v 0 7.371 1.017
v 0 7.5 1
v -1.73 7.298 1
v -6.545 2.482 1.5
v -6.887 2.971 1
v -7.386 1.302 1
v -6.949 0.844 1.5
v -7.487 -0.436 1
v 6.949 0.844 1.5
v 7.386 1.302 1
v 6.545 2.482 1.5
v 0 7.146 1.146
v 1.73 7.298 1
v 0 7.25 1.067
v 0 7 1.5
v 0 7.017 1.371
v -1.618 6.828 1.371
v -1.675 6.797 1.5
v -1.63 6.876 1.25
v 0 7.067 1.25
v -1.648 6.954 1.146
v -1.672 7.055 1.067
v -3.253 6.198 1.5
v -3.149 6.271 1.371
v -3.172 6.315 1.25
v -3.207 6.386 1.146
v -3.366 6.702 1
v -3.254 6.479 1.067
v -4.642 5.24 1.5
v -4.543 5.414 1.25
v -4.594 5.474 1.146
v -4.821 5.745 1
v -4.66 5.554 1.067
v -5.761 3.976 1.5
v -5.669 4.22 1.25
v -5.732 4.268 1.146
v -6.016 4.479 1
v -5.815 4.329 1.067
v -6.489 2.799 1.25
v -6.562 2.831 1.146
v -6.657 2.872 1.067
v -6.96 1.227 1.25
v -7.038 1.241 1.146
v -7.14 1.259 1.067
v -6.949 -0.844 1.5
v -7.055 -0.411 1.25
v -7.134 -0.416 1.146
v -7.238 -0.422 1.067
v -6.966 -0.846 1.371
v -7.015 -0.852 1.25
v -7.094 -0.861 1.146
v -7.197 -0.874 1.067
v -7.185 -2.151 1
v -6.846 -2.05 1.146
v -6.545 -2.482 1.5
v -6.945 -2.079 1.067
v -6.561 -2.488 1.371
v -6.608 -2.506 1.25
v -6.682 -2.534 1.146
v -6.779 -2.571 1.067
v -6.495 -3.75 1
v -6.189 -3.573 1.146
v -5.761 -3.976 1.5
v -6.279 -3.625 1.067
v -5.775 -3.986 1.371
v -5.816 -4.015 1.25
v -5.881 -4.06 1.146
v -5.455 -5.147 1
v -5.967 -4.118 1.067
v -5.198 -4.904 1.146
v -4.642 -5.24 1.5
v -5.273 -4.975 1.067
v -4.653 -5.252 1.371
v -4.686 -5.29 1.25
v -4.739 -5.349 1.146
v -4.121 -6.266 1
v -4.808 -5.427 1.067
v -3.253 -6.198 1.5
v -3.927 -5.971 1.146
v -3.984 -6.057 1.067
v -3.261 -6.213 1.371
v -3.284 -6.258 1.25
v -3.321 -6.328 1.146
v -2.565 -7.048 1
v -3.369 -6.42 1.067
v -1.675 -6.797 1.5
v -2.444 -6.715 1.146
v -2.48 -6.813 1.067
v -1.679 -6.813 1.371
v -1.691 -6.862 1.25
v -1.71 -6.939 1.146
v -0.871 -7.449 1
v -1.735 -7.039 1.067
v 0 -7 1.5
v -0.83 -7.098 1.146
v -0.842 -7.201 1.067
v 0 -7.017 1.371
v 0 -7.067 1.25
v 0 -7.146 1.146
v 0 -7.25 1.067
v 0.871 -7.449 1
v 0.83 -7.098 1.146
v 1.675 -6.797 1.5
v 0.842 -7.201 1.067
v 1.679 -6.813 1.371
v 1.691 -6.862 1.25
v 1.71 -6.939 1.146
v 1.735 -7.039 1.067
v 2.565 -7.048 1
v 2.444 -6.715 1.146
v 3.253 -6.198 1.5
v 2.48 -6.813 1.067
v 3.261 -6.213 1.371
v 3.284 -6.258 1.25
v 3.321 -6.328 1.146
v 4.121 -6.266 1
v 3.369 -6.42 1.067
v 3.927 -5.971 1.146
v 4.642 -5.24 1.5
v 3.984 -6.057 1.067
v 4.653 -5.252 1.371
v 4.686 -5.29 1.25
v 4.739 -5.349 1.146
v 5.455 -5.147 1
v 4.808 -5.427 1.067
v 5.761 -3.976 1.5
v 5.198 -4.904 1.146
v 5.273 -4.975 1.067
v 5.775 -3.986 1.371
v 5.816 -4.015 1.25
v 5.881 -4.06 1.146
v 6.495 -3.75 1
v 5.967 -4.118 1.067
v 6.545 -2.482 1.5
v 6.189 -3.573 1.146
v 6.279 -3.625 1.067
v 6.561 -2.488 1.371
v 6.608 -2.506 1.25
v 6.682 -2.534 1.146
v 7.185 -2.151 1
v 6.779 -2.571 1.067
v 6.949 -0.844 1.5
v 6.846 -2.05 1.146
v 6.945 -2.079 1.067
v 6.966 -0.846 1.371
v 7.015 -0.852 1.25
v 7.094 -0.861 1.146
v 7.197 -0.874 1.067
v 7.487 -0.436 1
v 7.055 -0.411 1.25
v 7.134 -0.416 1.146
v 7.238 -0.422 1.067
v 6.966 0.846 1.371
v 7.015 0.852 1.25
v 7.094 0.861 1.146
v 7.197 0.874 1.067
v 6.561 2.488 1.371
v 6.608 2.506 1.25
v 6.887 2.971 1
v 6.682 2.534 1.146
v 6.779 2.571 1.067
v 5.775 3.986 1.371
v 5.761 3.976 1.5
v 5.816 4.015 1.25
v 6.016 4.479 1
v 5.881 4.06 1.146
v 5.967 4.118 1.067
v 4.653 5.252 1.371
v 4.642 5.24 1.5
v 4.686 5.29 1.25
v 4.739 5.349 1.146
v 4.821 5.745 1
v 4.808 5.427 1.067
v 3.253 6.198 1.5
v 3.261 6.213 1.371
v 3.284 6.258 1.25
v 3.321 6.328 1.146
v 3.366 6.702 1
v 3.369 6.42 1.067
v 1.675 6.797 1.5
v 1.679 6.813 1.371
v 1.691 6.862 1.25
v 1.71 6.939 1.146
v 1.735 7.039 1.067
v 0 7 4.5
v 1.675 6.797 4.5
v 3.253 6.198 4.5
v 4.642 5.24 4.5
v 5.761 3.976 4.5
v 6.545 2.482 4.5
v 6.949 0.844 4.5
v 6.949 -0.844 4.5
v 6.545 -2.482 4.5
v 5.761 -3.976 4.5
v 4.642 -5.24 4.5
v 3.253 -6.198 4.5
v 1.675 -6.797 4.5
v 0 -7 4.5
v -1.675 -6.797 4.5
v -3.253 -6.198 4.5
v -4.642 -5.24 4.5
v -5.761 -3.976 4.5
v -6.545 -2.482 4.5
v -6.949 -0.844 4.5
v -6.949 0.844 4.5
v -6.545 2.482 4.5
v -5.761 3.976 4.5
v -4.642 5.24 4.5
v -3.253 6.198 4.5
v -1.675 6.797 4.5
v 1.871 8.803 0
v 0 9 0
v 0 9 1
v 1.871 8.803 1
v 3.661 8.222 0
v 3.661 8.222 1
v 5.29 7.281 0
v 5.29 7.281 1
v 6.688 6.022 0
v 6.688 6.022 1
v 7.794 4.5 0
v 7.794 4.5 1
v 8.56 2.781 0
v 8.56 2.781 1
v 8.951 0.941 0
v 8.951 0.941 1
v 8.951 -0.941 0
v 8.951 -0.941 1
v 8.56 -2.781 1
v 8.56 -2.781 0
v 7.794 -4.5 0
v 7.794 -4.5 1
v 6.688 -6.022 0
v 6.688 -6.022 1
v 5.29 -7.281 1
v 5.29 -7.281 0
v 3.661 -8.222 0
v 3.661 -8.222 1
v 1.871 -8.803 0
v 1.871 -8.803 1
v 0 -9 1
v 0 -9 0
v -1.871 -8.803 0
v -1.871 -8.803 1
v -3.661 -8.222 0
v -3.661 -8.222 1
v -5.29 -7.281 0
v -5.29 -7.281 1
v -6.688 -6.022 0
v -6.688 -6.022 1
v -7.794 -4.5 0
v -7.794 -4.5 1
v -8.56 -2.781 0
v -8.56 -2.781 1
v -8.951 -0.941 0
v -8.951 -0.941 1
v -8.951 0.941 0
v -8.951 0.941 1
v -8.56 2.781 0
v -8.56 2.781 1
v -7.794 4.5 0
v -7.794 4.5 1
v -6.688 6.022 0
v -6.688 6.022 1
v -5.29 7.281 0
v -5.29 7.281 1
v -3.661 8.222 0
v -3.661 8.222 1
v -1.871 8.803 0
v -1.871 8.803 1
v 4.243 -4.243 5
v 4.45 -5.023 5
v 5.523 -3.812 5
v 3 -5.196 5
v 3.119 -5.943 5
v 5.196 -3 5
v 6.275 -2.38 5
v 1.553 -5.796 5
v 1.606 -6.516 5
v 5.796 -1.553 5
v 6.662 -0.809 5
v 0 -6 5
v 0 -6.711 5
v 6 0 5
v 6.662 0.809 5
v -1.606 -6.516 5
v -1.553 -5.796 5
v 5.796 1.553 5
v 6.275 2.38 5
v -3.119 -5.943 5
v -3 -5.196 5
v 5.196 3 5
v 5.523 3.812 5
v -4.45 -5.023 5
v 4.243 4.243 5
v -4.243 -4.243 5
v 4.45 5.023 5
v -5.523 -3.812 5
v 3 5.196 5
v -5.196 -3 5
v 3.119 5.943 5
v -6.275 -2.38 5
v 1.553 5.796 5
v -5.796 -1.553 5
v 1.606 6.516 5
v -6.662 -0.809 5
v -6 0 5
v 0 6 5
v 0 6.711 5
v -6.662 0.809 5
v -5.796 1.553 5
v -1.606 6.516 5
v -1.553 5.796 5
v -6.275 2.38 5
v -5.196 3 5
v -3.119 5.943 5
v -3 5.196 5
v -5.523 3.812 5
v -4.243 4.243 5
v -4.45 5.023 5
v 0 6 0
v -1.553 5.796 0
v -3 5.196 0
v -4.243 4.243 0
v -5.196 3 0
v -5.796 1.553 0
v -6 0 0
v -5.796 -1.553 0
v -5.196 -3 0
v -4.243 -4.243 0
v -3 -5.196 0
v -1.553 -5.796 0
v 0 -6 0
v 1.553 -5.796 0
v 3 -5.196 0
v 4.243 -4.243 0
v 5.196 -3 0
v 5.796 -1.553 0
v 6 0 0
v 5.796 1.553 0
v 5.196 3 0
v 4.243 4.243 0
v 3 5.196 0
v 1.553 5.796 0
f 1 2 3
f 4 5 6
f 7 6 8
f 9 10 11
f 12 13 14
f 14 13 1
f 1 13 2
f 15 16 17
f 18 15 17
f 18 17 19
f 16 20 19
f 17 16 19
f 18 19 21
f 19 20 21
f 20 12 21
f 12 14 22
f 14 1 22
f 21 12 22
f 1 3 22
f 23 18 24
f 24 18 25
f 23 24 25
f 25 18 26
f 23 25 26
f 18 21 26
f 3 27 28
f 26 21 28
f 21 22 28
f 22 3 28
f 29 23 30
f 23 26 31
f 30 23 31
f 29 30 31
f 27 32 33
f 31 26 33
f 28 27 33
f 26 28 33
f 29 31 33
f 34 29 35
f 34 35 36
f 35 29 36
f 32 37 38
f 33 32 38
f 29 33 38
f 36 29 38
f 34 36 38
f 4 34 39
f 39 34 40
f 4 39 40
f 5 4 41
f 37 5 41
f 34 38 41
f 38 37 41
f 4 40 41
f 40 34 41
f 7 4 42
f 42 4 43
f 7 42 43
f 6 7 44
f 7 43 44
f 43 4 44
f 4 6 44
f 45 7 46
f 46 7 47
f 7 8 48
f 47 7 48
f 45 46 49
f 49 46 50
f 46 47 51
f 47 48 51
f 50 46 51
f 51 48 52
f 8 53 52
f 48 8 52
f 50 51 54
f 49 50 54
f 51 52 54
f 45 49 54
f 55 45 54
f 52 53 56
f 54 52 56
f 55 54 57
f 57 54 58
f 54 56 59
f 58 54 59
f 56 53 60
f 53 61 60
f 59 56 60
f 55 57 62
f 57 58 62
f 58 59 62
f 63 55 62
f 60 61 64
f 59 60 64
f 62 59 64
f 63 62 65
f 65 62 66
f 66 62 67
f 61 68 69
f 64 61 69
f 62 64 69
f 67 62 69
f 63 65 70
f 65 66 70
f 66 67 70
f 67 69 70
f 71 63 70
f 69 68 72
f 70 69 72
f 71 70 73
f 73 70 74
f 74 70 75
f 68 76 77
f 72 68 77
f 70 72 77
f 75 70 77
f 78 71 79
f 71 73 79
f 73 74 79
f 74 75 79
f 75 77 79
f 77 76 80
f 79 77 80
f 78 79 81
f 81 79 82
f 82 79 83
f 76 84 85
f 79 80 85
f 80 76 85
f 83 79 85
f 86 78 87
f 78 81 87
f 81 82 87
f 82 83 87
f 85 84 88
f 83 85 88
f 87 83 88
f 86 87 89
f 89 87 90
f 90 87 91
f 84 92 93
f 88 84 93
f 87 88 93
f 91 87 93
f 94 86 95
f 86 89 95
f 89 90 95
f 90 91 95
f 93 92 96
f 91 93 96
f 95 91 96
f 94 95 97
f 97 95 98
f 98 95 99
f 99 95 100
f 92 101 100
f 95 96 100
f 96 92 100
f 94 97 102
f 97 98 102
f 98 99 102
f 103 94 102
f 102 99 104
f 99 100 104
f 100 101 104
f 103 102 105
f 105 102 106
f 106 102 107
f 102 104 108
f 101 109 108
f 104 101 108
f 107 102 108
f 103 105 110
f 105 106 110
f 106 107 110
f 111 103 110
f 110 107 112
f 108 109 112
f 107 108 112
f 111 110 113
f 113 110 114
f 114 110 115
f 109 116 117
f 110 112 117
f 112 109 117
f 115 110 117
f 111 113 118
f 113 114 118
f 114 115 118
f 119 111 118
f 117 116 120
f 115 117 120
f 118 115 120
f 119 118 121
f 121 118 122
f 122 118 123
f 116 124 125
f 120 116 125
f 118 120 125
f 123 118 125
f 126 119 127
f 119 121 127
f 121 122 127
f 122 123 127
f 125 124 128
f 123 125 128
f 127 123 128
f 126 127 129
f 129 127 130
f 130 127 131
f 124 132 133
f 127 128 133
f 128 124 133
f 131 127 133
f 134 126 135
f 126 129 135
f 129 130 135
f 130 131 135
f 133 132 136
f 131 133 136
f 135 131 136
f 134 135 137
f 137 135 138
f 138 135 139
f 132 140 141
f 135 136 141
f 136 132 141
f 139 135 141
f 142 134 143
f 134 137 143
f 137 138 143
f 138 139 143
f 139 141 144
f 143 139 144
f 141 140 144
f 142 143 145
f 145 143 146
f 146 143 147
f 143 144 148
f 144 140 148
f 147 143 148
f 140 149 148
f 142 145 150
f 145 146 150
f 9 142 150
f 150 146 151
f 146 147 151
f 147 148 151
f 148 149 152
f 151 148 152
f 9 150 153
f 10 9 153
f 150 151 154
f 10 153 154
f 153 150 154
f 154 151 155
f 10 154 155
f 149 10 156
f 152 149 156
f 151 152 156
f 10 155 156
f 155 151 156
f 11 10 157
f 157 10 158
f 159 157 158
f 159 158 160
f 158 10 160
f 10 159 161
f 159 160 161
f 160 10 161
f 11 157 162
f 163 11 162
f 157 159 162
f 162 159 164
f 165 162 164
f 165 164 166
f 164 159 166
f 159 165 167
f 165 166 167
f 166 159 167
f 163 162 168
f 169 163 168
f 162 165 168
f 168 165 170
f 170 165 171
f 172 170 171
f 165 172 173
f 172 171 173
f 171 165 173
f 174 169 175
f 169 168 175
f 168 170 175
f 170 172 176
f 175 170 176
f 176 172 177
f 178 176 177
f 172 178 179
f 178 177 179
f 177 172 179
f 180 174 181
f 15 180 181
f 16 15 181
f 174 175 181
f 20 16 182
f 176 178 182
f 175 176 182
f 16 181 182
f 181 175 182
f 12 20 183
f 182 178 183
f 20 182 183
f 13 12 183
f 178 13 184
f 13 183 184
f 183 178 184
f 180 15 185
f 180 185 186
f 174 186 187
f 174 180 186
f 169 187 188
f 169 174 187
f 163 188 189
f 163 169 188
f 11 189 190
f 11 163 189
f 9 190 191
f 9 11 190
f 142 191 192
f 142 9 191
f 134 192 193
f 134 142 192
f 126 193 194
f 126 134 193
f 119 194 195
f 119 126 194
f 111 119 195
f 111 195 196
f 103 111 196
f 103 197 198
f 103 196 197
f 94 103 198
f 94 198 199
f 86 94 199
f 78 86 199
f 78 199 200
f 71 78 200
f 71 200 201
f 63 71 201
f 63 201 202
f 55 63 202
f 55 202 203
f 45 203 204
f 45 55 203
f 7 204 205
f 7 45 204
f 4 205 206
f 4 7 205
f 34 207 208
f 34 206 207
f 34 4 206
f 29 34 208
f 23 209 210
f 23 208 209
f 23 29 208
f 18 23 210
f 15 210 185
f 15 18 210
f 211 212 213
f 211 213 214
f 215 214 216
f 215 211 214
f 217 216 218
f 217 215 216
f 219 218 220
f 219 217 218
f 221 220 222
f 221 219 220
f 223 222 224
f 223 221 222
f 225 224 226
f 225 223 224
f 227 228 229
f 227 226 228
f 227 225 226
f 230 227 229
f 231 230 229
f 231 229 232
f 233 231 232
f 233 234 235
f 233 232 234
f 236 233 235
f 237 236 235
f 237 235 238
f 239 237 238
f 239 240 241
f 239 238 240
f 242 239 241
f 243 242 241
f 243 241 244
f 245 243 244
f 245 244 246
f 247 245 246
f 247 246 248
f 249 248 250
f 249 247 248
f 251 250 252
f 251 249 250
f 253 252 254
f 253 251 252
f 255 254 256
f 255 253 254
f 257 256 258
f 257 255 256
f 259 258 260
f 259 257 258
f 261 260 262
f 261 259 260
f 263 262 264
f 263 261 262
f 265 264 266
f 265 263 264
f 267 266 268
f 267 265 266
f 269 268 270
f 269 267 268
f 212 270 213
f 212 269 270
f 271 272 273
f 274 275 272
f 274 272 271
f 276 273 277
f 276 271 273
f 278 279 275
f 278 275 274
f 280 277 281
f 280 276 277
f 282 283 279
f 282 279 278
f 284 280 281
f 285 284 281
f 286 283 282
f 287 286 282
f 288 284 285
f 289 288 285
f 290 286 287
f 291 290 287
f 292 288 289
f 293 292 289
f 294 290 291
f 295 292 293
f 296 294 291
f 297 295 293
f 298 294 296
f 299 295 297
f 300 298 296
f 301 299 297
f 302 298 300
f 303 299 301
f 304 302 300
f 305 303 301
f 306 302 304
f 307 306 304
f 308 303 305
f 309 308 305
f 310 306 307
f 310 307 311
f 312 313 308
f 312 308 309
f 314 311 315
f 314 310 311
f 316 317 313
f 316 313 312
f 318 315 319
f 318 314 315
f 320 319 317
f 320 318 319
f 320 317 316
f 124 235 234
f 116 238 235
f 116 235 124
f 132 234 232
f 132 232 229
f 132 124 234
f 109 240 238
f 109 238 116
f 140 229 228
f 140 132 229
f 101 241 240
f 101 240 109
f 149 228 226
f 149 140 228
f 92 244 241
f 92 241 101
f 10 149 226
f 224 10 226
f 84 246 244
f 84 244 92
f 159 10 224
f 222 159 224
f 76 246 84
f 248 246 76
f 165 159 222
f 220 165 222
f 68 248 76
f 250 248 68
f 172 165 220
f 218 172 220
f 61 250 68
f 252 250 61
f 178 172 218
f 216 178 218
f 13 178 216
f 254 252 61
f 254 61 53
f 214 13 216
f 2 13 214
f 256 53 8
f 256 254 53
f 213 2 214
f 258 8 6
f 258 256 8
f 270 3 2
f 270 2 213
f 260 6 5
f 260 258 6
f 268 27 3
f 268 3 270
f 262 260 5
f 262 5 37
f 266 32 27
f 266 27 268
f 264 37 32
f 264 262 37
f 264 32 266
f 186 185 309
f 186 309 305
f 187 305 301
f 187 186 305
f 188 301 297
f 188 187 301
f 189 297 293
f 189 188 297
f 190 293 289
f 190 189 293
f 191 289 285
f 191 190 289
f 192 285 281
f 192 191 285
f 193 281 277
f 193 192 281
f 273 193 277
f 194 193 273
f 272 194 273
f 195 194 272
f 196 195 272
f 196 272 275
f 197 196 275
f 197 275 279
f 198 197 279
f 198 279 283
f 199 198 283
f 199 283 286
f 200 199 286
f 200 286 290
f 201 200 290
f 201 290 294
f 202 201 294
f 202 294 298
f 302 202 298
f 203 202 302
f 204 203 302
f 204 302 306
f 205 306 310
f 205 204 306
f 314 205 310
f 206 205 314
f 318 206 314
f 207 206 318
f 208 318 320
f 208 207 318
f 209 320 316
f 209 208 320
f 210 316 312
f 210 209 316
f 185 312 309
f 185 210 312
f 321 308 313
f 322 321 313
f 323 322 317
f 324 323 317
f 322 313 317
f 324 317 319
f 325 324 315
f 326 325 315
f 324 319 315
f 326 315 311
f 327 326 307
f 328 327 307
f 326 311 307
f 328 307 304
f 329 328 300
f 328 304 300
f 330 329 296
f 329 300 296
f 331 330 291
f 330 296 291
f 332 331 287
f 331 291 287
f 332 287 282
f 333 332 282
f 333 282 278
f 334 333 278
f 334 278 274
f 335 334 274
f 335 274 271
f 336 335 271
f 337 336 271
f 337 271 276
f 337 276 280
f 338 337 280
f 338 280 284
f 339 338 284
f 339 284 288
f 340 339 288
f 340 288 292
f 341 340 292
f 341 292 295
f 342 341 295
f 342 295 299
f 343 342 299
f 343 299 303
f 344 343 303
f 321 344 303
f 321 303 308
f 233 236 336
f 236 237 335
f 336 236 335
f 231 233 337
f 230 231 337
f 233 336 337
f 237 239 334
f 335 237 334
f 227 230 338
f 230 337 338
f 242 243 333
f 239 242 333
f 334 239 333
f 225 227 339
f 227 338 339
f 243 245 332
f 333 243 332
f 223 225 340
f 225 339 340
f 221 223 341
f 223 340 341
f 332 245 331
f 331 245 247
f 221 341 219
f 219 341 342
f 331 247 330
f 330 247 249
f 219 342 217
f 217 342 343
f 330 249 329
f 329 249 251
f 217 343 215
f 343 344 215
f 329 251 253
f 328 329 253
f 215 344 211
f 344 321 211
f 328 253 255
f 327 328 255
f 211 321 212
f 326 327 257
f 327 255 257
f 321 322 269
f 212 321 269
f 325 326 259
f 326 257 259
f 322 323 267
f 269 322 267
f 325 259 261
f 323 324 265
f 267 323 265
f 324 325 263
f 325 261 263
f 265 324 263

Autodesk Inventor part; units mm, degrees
ref_plane "YZ Plane" through (0, 0, 0) normal (1, 0, 0) x (0, 1, 0)
ref_plane "XZ Plane" through (0, 0, 0) normal (0, 1, 0) x (-1, 0, 0)
ref_plane "XY Plane" through (0, 0, 0) normal (0, 0, 1) x (1, 0, 0)
sketch "スケッチ1" plane through (0, 0, 0) normal (1, 0, 0) x (0, 1, 0)
  line L0 (0, -1) -> (0, 6) construction
  line L1 (6, 5) -> (7, 5)
  line L2 (7, 5) -> (7, 0)
  line L3 (7, 0) -> (6, 0)
  line L4 (6, 0) -> (6, 5)
  line L5 (7, 1) -> (9, 1)
  line L6 (9, 1) -> (9, 0)
  line L7 (9, 0) -> (7, 0)
  line L8 (7, 0) -> (7, 1)
  point P0 (0, 0)
  point P1 (7, 0)
  dimension "d0" = 12
  dimension "d1" = 14
  dimension "d10" = 5
  dimension "d14" = 1
  dimension "d15" = 18
revolve "回転1" add sketch "スケッチ1" angle 360 about axis through (0, 0, -10) along (0, 0, 1)
chamfer "面取り1" distance 0.5 angle 30 1 edges at (0, -7, 5) measured on face at (0.5633, 6.9773, 2.3333)
fillet "フィレット2" radius 0.5 1 edges at (0, -7, 1)
properties part number "_GFM-0608-04" material "アセタール樹脂、黒"
